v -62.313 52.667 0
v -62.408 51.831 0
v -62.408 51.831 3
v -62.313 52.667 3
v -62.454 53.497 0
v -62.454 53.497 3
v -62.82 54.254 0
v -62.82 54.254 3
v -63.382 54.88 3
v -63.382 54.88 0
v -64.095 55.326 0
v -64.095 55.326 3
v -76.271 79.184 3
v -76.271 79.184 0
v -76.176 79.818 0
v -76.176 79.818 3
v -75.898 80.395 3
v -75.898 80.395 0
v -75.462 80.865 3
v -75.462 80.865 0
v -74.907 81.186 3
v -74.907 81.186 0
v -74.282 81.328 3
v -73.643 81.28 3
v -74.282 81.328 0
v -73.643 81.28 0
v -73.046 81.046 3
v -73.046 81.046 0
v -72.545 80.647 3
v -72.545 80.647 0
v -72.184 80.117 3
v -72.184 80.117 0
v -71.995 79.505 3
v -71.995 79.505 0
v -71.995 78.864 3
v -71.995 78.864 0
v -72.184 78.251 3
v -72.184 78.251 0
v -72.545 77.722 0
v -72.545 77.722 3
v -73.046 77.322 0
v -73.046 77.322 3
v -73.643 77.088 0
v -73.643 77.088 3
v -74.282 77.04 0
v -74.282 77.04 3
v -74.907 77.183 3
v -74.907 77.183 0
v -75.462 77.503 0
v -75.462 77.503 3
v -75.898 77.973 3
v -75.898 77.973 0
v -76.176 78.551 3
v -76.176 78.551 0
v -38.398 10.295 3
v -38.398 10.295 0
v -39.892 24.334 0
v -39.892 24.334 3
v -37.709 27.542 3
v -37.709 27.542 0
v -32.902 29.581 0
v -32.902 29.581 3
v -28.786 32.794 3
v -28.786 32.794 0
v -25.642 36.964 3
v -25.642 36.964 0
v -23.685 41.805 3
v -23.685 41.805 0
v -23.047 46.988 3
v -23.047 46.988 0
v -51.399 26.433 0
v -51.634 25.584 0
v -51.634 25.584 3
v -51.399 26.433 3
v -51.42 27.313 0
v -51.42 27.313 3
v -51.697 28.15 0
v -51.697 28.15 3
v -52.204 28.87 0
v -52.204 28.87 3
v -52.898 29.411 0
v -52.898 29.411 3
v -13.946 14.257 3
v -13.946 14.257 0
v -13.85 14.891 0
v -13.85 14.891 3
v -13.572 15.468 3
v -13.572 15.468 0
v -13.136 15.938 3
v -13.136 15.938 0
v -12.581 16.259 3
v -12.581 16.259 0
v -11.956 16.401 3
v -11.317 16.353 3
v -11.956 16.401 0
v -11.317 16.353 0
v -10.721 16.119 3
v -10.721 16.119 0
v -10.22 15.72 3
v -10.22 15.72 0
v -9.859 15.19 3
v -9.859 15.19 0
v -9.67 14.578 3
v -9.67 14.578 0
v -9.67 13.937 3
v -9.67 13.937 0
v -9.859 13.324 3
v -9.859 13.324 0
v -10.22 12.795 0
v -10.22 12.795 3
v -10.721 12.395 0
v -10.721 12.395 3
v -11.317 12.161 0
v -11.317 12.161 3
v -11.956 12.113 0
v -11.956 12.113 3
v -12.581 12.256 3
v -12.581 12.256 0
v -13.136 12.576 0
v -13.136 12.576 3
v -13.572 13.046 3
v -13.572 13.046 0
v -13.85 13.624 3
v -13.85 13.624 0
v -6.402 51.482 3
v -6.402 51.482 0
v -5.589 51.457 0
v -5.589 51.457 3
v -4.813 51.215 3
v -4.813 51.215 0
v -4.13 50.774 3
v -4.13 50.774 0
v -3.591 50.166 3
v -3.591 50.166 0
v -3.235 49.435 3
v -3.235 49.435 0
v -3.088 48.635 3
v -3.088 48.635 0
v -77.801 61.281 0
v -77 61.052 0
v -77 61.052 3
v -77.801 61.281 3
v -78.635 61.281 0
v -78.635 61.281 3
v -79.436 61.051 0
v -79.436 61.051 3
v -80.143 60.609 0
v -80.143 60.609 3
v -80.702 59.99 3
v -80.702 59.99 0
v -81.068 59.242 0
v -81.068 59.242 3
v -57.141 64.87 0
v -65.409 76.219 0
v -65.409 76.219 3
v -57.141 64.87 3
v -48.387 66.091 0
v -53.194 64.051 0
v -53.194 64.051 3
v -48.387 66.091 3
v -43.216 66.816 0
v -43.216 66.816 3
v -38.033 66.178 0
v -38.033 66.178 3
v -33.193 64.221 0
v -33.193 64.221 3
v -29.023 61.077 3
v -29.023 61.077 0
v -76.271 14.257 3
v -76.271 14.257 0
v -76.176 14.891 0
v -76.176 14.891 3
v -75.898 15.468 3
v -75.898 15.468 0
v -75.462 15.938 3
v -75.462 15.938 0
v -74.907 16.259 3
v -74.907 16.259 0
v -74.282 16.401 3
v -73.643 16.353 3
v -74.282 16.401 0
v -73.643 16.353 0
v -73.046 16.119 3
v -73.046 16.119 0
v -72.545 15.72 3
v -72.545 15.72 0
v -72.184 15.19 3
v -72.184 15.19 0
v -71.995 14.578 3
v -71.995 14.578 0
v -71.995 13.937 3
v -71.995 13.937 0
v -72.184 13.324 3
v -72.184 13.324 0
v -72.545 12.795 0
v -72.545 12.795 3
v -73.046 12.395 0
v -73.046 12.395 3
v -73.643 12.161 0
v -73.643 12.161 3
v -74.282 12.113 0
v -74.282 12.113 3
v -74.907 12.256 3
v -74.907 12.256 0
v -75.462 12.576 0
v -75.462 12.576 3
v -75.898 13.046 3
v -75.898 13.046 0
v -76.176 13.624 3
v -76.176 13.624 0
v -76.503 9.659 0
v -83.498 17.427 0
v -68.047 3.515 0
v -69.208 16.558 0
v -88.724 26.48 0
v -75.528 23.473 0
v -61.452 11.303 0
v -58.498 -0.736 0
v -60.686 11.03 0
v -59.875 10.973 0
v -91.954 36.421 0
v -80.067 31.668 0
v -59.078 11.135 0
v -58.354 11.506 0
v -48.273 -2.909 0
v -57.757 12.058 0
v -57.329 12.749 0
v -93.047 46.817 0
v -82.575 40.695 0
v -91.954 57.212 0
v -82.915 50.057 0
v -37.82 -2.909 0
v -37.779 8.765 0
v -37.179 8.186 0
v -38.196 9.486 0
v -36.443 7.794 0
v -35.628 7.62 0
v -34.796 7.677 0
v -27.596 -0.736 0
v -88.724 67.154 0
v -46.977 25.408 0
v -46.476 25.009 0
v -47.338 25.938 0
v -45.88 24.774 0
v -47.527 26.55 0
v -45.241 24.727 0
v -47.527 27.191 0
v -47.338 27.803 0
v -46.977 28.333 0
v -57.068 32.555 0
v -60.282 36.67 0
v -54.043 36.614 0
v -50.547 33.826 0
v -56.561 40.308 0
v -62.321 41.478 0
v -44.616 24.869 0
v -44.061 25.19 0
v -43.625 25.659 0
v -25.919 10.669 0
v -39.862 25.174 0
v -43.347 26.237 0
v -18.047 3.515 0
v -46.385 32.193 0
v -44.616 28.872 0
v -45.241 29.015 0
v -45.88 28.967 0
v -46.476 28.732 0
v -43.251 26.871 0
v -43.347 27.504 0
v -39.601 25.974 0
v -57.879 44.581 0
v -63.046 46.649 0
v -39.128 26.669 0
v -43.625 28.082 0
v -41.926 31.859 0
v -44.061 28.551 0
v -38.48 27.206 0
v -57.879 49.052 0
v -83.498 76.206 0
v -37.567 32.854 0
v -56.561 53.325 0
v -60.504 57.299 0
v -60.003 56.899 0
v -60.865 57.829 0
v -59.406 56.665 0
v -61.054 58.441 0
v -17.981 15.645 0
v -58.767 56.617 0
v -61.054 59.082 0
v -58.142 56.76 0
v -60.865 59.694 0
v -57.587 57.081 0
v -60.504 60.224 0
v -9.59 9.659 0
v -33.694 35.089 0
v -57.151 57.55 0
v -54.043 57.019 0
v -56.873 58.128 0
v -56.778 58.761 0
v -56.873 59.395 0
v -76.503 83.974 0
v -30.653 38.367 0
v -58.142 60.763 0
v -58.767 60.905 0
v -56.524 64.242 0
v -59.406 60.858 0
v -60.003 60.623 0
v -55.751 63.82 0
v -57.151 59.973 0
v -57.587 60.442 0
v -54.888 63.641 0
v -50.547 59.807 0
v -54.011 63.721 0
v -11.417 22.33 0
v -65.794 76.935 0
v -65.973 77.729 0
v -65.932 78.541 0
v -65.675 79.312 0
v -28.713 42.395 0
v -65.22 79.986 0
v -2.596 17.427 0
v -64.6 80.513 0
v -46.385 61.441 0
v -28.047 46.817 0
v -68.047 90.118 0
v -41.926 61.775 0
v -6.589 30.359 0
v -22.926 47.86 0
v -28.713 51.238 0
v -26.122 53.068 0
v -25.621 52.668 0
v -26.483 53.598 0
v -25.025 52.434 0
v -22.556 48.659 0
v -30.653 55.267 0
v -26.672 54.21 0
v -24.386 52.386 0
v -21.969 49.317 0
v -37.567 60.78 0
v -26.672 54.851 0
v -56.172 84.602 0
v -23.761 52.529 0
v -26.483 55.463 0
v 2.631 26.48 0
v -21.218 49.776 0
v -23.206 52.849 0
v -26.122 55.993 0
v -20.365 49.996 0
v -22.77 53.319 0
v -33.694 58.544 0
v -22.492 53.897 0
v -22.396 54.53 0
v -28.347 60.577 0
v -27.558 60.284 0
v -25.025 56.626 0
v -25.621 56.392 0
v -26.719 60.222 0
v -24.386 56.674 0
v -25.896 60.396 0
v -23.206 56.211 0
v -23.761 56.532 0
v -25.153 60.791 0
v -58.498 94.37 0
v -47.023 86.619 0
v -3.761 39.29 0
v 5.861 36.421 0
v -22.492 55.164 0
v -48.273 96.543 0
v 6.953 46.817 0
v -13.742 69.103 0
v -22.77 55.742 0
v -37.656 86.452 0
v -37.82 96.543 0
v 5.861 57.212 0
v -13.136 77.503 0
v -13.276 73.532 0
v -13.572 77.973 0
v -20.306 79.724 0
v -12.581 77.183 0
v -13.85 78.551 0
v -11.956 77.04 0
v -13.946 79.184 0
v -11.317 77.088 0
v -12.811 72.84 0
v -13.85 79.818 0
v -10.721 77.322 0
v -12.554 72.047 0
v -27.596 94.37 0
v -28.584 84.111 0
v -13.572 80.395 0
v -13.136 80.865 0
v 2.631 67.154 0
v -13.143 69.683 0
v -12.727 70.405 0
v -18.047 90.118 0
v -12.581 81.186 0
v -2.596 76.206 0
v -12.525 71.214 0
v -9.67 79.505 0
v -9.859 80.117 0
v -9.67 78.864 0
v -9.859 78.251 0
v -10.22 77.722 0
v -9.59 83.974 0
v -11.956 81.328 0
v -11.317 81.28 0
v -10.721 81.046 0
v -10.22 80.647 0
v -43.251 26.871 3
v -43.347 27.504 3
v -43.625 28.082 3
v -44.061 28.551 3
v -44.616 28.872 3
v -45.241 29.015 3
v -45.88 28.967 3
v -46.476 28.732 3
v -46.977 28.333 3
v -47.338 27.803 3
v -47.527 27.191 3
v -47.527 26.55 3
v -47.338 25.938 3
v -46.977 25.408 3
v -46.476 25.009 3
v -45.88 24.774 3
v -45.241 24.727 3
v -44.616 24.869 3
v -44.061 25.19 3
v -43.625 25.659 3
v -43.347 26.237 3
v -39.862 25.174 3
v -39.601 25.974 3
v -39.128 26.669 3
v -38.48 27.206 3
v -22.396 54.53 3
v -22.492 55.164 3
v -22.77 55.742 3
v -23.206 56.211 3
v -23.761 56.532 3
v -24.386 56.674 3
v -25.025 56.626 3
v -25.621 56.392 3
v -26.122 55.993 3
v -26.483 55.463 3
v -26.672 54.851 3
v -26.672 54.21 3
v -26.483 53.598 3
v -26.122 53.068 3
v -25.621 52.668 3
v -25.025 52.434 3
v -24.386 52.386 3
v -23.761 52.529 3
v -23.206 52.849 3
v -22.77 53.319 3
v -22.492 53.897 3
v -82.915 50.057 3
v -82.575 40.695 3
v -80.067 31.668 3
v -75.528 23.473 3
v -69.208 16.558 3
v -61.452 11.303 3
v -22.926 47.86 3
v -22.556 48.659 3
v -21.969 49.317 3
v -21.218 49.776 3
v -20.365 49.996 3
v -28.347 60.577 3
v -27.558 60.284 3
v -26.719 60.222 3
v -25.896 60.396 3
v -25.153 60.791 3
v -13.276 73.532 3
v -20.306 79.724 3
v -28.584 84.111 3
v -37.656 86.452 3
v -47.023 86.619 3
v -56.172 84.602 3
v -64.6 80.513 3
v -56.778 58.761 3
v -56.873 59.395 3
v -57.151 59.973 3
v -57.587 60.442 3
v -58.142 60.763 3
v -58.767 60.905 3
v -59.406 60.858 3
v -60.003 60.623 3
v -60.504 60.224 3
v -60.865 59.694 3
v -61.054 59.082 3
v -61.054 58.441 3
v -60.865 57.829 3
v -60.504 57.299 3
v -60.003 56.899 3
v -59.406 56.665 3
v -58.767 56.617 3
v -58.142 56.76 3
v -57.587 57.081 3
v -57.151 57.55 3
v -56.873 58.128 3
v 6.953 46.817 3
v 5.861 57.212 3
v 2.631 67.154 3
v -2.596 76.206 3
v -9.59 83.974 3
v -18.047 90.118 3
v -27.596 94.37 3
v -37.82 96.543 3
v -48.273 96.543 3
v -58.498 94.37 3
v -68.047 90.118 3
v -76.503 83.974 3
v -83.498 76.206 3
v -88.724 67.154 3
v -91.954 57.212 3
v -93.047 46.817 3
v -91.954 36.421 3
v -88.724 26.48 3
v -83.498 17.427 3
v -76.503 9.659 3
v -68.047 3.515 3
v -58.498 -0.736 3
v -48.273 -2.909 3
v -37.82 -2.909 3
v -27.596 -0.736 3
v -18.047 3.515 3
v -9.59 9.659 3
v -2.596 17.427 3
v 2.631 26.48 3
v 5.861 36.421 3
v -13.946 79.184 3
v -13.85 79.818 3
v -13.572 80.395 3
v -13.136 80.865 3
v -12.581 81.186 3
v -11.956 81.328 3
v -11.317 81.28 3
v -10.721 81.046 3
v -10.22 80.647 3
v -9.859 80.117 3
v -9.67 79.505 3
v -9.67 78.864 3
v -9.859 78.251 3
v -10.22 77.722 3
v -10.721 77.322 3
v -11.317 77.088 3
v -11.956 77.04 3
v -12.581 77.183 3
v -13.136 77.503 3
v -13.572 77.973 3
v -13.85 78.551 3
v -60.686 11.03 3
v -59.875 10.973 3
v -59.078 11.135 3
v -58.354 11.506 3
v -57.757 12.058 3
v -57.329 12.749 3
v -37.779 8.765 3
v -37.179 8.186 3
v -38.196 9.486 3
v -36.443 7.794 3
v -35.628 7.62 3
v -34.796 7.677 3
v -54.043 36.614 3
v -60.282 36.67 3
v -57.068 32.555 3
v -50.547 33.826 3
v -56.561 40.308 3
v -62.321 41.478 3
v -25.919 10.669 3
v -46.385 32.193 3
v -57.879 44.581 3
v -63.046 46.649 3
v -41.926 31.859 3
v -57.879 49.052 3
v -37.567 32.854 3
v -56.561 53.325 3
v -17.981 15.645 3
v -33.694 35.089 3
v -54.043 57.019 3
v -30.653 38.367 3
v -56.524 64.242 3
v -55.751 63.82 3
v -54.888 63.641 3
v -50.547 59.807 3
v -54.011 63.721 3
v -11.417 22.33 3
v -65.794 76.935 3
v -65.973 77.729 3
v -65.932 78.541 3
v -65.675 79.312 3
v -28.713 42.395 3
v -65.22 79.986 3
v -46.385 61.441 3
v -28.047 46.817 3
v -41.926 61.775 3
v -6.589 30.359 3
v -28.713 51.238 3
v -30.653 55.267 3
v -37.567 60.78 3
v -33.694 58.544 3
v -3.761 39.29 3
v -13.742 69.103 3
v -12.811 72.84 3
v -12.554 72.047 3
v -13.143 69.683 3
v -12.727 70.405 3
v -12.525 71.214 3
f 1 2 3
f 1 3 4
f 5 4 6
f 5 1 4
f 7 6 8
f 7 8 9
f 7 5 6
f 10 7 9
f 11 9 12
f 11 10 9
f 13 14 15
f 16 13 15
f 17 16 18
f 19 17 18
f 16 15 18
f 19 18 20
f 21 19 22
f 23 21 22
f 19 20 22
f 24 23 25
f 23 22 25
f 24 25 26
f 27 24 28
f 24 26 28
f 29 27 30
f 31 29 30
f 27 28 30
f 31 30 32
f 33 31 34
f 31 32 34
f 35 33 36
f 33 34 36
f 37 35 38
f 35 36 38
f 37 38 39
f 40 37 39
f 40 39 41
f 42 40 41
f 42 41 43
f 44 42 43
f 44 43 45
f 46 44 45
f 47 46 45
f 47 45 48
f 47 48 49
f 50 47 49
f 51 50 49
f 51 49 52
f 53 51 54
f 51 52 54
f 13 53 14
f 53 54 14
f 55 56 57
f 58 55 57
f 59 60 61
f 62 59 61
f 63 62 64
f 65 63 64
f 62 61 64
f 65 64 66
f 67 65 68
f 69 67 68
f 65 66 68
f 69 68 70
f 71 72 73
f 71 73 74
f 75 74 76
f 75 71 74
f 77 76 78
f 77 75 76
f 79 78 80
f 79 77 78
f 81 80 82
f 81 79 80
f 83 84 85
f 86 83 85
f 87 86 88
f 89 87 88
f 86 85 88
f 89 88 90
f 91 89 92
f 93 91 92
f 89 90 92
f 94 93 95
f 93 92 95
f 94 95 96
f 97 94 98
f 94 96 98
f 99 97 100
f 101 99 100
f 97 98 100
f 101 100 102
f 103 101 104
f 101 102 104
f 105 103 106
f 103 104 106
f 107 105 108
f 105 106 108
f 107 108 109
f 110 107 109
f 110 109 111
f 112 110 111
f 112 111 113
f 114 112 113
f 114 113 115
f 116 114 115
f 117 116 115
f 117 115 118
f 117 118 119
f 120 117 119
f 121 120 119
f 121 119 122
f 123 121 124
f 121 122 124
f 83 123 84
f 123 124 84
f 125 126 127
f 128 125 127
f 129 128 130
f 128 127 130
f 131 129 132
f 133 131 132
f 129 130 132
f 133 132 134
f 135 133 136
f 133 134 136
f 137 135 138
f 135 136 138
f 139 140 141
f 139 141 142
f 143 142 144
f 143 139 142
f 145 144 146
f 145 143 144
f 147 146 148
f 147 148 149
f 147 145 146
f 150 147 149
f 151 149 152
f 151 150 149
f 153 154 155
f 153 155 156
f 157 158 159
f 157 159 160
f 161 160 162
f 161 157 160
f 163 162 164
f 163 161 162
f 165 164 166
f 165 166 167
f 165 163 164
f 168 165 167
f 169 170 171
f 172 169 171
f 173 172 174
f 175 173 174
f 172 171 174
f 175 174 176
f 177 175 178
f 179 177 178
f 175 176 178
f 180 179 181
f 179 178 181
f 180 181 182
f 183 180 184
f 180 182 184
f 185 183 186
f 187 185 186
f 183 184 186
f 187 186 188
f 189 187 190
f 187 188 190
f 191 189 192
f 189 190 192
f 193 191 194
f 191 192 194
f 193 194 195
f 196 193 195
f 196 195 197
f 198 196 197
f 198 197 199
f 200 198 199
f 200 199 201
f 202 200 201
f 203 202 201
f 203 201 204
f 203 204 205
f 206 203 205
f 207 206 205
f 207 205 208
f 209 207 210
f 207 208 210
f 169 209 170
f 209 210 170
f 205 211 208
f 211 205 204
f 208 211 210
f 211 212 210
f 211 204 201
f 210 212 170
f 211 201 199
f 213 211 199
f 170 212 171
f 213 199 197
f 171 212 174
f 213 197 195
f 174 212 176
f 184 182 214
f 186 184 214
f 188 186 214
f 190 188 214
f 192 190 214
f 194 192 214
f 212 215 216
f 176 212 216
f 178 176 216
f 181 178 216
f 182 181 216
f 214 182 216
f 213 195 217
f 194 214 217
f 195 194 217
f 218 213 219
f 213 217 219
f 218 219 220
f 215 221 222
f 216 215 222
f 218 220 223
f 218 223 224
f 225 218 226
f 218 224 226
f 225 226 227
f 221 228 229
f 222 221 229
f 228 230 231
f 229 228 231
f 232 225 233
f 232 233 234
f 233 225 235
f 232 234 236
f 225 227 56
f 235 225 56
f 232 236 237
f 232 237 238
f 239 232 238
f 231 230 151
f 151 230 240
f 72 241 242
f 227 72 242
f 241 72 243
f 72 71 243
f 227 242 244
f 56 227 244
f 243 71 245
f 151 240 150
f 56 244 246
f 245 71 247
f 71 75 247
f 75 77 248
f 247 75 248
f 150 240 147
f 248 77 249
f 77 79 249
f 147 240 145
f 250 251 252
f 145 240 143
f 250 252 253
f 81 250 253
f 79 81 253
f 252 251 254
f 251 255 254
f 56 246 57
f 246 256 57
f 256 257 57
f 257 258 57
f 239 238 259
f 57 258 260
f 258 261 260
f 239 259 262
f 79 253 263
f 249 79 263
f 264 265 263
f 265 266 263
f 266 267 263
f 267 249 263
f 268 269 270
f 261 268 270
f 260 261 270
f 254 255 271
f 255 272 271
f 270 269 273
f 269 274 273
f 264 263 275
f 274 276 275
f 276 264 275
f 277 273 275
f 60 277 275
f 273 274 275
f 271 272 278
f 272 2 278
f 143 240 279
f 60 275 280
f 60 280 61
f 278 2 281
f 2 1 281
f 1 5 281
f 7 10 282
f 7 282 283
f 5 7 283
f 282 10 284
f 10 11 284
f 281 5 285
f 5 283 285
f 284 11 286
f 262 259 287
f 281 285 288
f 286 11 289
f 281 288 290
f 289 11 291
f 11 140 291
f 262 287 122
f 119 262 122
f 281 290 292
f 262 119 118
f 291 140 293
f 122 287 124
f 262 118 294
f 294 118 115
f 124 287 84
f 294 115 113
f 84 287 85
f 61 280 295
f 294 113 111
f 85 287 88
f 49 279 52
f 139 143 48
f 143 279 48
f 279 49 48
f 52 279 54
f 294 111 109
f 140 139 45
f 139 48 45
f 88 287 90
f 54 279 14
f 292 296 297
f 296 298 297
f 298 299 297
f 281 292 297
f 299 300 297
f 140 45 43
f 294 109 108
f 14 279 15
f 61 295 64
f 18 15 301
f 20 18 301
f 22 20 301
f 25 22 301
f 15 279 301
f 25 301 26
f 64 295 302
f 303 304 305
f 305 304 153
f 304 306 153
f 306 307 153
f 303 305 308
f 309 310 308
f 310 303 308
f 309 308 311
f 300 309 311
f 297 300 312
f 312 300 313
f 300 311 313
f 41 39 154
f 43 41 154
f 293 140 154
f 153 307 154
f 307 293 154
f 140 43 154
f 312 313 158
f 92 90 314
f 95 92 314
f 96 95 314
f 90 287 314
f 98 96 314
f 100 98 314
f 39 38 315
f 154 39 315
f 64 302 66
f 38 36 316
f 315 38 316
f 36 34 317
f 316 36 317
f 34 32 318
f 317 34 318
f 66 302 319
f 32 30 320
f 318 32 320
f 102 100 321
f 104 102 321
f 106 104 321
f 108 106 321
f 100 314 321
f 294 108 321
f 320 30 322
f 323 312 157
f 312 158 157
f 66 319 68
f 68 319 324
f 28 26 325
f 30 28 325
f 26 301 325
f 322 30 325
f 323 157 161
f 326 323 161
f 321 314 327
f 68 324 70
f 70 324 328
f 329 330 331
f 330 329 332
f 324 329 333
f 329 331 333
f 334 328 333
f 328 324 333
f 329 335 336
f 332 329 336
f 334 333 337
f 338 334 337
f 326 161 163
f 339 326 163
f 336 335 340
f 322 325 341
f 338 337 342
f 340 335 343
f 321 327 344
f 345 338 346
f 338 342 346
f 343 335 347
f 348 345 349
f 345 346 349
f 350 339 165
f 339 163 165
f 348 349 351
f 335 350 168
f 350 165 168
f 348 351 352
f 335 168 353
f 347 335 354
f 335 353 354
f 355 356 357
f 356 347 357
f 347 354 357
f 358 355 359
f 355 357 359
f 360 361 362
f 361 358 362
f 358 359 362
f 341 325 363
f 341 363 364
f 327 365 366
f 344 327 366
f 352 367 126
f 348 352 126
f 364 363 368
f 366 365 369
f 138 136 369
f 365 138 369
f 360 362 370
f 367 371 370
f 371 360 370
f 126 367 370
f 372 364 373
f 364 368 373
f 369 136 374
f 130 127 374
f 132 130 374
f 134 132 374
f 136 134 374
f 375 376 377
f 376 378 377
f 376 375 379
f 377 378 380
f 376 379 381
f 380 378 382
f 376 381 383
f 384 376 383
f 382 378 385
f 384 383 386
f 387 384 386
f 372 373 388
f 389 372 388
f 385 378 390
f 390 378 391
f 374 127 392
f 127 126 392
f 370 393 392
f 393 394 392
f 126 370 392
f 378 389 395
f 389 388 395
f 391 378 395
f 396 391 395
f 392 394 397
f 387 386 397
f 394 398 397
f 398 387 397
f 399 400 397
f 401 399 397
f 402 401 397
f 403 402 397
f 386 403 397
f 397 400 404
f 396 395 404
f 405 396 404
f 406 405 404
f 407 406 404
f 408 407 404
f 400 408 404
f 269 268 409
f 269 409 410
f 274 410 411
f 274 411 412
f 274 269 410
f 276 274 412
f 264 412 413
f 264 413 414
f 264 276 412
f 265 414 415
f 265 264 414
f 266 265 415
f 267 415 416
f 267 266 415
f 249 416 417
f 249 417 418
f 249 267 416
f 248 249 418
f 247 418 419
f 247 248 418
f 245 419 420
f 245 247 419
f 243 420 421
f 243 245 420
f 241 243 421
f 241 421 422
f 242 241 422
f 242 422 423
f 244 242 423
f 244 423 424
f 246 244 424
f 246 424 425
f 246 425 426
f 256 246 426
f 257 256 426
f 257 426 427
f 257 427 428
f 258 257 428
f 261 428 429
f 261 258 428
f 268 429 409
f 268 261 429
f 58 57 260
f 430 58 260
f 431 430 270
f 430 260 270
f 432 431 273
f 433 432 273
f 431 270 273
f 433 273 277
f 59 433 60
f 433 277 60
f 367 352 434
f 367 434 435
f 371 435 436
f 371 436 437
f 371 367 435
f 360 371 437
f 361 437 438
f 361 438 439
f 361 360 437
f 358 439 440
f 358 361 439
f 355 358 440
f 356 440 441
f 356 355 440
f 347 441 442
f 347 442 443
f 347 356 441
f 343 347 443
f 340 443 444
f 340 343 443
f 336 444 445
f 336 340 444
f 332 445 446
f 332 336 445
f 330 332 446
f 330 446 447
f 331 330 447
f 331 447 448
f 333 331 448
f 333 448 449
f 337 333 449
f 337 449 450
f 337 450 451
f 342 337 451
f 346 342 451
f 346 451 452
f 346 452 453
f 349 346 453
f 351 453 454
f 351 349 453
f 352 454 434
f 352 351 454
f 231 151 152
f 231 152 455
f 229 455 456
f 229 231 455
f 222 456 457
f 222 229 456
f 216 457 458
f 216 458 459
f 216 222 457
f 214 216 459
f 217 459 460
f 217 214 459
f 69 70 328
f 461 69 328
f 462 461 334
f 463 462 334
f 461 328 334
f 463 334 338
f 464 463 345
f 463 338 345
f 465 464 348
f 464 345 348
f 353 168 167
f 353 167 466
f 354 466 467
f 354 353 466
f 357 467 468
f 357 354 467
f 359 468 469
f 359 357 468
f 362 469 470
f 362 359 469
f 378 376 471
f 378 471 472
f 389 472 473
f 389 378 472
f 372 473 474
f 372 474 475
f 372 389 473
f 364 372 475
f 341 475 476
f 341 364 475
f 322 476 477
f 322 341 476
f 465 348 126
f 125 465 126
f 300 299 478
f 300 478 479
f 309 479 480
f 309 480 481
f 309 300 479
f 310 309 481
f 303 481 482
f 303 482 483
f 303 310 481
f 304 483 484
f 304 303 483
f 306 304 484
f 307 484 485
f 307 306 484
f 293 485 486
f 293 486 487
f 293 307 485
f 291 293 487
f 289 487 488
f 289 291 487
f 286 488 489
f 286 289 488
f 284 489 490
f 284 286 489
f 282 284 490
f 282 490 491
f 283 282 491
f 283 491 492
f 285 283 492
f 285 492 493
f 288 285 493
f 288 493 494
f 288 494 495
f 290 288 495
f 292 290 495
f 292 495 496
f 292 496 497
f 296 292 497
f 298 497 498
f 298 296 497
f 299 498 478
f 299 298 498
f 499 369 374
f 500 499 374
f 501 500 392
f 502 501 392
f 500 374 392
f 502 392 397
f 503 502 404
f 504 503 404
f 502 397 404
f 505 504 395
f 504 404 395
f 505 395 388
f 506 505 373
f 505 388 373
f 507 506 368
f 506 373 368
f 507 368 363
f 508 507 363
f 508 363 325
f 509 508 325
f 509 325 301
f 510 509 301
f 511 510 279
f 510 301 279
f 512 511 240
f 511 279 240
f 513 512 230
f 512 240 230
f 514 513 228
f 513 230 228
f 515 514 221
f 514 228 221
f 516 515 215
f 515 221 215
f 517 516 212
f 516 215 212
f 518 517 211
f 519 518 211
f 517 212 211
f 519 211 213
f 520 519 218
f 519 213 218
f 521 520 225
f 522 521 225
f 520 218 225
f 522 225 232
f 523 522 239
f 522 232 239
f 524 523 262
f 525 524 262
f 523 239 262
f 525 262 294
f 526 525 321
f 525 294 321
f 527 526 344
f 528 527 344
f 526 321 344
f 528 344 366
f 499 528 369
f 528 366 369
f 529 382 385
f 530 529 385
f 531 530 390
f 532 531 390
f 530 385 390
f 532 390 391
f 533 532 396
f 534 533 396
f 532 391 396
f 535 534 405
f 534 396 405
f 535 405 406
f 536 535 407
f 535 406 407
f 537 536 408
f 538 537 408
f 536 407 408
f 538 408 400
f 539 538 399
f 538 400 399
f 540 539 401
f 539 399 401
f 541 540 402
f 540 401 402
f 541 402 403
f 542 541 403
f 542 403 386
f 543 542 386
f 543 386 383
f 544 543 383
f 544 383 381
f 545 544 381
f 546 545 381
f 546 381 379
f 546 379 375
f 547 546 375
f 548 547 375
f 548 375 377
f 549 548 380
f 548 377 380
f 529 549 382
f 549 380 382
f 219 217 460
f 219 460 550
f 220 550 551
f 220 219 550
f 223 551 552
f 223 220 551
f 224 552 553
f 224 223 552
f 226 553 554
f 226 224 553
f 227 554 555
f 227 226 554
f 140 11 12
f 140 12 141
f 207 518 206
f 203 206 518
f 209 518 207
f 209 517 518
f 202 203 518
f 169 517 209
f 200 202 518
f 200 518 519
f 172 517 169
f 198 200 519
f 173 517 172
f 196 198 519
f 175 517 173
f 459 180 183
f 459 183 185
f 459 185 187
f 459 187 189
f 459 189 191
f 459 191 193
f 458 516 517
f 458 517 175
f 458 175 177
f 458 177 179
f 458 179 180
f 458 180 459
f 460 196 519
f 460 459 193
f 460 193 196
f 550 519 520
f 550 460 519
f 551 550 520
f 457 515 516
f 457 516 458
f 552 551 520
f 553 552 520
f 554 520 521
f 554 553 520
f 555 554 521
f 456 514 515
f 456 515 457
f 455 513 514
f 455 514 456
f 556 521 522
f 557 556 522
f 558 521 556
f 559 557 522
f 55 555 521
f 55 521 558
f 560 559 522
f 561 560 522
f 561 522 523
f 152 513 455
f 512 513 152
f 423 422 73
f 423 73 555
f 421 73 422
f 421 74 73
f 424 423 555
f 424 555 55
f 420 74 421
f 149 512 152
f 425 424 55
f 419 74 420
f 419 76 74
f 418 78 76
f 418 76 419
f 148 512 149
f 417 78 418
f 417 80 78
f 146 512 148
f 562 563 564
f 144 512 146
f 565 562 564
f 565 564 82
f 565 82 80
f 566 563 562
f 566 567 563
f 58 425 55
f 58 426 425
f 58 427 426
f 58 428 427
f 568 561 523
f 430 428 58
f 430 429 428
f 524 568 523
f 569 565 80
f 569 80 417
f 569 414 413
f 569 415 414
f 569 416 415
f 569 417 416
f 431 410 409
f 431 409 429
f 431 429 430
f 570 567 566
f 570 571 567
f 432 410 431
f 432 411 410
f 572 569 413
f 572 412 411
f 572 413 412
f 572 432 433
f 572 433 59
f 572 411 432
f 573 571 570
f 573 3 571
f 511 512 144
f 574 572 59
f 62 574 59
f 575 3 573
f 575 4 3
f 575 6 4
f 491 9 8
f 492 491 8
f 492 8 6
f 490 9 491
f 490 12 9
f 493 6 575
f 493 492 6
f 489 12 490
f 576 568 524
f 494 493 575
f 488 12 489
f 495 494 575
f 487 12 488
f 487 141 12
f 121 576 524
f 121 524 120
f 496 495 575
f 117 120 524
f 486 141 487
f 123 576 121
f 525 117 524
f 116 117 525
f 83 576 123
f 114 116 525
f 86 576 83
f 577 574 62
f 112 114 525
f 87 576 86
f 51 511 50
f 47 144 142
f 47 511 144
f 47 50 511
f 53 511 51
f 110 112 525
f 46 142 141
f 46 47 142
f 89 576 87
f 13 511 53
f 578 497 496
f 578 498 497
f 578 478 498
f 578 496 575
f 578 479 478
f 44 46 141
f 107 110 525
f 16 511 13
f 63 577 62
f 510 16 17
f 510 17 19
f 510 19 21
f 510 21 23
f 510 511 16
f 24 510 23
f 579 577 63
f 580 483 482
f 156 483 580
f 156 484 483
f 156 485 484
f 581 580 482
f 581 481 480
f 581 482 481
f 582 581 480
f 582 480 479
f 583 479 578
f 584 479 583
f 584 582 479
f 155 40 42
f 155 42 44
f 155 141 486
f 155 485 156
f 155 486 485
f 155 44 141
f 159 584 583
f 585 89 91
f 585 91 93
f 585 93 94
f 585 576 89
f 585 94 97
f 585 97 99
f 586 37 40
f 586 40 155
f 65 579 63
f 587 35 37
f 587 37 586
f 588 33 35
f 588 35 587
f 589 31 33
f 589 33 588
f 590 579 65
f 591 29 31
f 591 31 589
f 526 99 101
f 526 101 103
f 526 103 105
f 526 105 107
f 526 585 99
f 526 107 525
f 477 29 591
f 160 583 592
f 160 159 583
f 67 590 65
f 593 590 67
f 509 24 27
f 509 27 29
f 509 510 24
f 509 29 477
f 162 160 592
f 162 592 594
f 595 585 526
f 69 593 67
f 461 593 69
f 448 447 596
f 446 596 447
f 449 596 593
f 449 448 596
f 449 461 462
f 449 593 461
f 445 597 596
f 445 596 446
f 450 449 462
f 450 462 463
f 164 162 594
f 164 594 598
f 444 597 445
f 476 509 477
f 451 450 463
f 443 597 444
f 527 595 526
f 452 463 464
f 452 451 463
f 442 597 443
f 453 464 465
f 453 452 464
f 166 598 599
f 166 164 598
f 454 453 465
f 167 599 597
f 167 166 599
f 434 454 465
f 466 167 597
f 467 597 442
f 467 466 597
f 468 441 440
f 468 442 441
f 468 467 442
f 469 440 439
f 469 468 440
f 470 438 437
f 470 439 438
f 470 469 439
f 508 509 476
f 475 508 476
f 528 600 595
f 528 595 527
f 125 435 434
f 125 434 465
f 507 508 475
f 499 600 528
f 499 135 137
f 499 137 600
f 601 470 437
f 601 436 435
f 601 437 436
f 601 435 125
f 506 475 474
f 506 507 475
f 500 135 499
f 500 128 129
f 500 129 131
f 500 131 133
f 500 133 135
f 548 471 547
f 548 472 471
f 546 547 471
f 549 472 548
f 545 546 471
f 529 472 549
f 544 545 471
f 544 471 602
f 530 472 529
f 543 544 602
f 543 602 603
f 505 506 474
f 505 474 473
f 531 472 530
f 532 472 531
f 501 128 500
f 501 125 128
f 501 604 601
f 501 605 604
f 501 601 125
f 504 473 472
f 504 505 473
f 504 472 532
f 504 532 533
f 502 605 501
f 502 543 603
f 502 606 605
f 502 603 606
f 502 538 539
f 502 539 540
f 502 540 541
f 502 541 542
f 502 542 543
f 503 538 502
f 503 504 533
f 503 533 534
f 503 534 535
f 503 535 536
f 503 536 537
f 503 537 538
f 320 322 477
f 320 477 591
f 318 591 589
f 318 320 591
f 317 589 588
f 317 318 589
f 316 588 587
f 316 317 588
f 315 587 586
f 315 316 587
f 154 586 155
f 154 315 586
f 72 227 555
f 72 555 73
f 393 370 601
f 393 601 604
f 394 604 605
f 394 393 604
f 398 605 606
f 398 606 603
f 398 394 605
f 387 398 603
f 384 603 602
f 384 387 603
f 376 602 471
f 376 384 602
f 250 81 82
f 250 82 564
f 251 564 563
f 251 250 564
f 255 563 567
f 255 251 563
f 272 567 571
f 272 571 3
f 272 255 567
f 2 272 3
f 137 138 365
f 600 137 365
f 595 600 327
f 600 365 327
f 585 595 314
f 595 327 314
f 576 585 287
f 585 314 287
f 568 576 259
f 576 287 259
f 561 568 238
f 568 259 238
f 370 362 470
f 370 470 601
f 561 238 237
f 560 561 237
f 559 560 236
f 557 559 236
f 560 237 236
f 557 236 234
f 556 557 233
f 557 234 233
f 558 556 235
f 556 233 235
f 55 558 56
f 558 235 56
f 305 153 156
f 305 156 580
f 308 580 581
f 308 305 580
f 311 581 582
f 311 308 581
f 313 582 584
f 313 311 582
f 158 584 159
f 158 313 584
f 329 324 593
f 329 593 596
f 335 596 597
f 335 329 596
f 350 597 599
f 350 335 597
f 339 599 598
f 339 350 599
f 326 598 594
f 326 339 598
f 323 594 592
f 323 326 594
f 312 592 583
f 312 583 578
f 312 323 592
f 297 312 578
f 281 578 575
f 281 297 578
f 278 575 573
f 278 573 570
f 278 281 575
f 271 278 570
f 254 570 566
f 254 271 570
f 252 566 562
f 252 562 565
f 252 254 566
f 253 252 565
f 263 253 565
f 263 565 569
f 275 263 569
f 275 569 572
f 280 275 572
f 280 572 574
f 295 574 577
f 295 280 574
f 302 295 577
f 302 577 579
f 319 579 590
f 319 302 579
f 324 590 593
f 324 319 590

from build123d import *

# Parameters (mm, degrees)
SKETCH_1_R          = 50
SKETCH_1_R_2        = 15
SKETCH_1_R_3        = 2.15
EXTRUDE_1_DEPTH     = 3
SKETCH_2_R          = 2.15
CUT_EXTRUDE_1_DEPTH = 3
CUT_EXTRUDE_2_DEPTH = 3


with BuildPart() as part:
    # 草图1 → 凸台-拉伸1 (new body)
    with BuildSketch(Plane.XY):
        with Locations((-43.046732458, 46.816740082)):
            Circle(SKETCH_1_R)
        with Locations((-43.046732458, 46.816740082)):
            Circle(SKETCH_1_R_2, mode=Mode.SUBTRACT)
        with Locations((-58.927913307, 58.761439339)):
            Circle(SKETCH_1_R_3, mode=Mode.SUBTRACT)
        with Locations((-45.401306439, 26.870517329)):
            Circle(SKETCH_1_R_3, mode=Mode.SUBTRACT)
        with Locations((-24.546261263, 54.530363509)):
            Circle(SKETCH_1_R_3, mode=Mode.SUBTRACT)
    extrude(amount=EXTRUDE_1_DEPTH)

    # 草图2 → 切除-拉伸1 (cut)
    with BuildSketch(Plane(origin=(0, 0, 0), x_dir=(-1, 0, 0), z_dir=(0, 0, -1))):
        with Locations((11.795724887, 79.184319745)):
            Circle(SKETCH_2_R)
        with Locations((74.121262453, 79.184319745)):
            Circle(SKETCH_2_R)
        with Locations((74.121262453, 14.25722704)):
            Circle(SKETCH_2_R)
        with Locations((11.795724887, 14.25722704)):
            Circle(SKETCH_2_R)
    extrude(amount=-CUT_EXTRUDE_1_DEPTH, mode=Mode.SUBTRACT)

    # 草图3 → 切除-拉伸2 (cut)
    with BuildSketch(Plane(origin=(0, 0, 0), x_dir=(-1, 0, 0), z_dir=(0, 0, -1))):
        with BuildLine():
            Line((25.153451443, 60.790750239), (13.742198917, 69.103210849))
            ThreePointArc((13.742198917, 69.103210849), (12.525075816, 71.213815689), (13.27574755, 73.531688287))
            ThreePointArc((13.27574755, 73.531688287), (37.655506434, 86.451758462), (64.600480937, 80.512970235))
            ThreePointArc((64.600480937, 80.512970235), (65.932157971, 78.540792241), (65.408806124, 76.219380472))
            Line((65.408806124, 76.219380472), (57.141381217, 64.869952453))
            ThreePointArc((57.141381217, 64.869952453), (55.325889869, 63.698864431), (53.194378054, 64.05116171))
            ThreePointArc((53.194378054, 64.05116171), (40.603919689, 66.666996145), (29.023333751, 61.076623977))
            ThreePointArc((29.023333751, 61.076623977), (27.140836024, 60.223758694), (25.153451443, 60.790750239))
        make_face()
        with BuildLine():
            Line((20.364867546, 49.996457779), (6.402262109, 51.481543763))
            ThreePointArc((6.402262109, 51.481543763), (4.130184621, 50.774073872), (3.088066895, 48.634718735))
            ThreePointArc((3.088066895, 48.634718735), (11.417412674, 22.330292198), (34.796401106, 7.676836753))
            ThreePointArc((34.796401106, 7.676836753), (37.179073525, 8.185672261), (38.398349384, 10.295034206))
            Line((38.398349384, 10.295034206), (39.891525177, 24.333699088))
            ThreePointArc((39.891525177, 24.333699088), (39.388861968, 26.338320394), (37.709010103, 27.542178607))
            ThreePointArc((37.709010103, 27.542178607), (27.07731282, 34.776074136), (23.047462711, 46.987648143))
            ThreePointArc((23.047462711, 46.987648143), (22.286805197, 49.009740163), (20.364867546, 49.996457779))
        make_face()
        with BuildLine():
            Line((64.095220754, 55.325770919), (76.999649074, 61.051975191))
            ThreePointArc((76.999649074, 61.051975191), (79.436048033, 61.050732296), (81.068048719, 59.241695206))
            ThreePointArc((81.068048719, 59.241695206), (80.067278266, 31.668169586), (61.451649543, 11.302531276))
            ThreePointArc((61.451649543, 11.302531276), (59.077854783, 11.135354132), (57.329129141, 12.749296011))
            Line((57.329129141, 12.749296011), (51.633948612, 25.583810014))
            ThreePointArc((51.633948612, 25.583810014), (51.527502308, 27.741615653), (52.898356609, 29.411410393))
            ThreePointArc((52.898356609, 29.411410393), (61.458964865, 39.007149965), (62.40785352, 51.831417662))
            ThreePointArc((62.40785352, 51.831417662), (62.610499382, 53.888141158), (64.095220754, 55.325770919))
        make_face()
    extrude(amount=-CUT_EXTRUDE_2_DEPTH, mode=Mode.SUBTRACT)


solid = part.part
